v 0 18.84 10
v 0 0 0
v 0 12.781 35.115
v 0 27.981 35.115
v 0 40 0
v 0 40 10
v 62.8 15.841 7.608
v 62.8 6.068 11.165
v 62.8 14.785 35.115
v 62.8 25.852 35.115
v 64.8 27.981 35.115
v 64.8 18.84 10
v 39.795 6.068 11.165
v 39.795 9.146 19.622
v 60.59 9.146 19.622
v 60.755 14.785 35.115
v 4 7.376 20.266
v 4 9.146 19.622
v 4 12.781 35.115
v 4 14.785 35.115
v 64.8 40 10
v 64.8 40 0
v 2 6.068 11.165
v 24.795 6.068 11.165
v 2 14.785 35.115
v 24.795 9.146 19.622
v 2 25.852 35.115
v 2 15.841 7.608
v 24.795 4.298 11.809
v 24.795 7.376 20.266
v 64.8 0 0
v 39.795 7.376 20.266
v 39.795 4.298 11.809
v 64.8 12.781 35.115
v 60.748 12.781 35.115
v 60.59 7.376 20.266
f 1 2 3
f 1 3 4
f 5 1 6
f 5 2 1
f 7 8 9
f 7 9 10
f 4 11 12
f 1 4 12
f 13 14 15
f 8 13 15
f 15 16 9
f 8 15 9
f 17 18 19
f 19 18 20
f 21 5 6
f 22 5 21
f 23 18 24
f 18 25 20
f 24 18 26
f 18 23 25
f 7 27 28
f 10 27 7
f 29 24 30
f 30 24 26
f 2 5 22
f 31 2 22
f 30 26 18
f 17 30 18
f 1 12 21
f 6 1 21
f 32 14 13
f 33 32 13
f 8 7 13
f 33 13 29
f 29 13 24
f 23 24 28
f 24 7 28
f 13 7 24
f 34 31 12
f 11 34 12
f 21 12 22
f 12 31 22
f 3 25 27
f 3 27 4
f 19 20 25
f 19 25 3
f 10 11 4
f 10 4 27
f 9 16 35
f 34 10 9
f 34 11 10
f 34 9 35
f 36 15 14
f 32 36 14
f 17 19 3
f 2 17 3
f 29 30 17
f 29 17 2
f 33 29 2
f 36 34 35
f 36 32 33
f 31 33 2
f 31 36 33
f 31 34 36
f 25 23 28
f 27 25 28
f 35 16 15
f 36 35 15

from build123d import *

# Parameters (mm, degrees)
SKETCH_W        = 64.8
SKETCH_H        = 40
PAD_DEPTH       = 40
POCKET_DEPTH    = 64.801
POCKET001_DEPTH = 64.801
POCKET002_DEPTH = 64.801
SKETCH004_W     = 60.8
SKETCH004_H     = 10.4
POCKET003_DEPTH = 30
POCKET004_DEPTH = 15.5651335663
POCKET005_DEPTH = 64.801


with BuildPart() as part:
    # Sketch → Pad (new body)
    with BuildSketch(Plane.XY):
        with Locations((32.4, 20)):
            Rectangle(SKETCH_W, SKETCH_H)
    extrude(amount=PAD_DEPTH)

    # Sketch001 → Pocket (cut, through all)
    with BuildSketch(Plane.YZ.offset(64.8)):
        Polygon((0, 0), (0, 40), (14.5588093668, 40), align=None)
    extrude(amount=-POCKET_DEPTH, mode=Mode.SUBTRACT)

    # Sketch002 → Pocket001 (cut, through all)
    with BuildSketch(Plane.YZ.offset(64.8)):
        Polygon((29.7588093668, 40), (18.8397023417, 10), (40, 10), (40, 40), align=None)
    extrude(amount=-POCKET001_DEPTH, mode=Mode.SUBTRACT)

    # Sketch003 → Pocket002 (cut, through all)
    with BuildSketch(Plane.YZ.offset(64.8)):
        Polygon((14.5588093668, 40), (27.9807471354, 35.1148141674), (29.7588093668, 40), align=None)
    extrude(amount=-POCKET002_DEPTH, mode=Mode.SUBTRACT)

    # Sketch004 → Pocket003 (cut)
    with BuildSketch(Plane(origin=(0, 14.5588093668, 40), x_dir=(1, 0, 0), z_dir=(0, 0.3420201432, 0.9396926208))):
        with Locations((32.4, 7.0833278364)):
            Rectangle(SKETCH004_W, SKETCH004_H)
    extrude(amount=-POCKET003_DEPTH, mode=Mode.SUBTRACT)

    # Sketch005 → Pocket004 (cut, through all)
    with BuildSketch(Plane(origin=(0, 1.7697492704, -0.6441360564), x_dir=(-1, 0, 0), z_dir=(0, 0.9396926208, -0.3420201432))):
        Polygon((-39.795, 21.5671108977), (-39.795, 12.5671108977), (-24.795, 12.5671108977), (-24.795, 21.5671108977), (-4, 21.5671108977), (-4, 42.5671108977), (-60.8, 42.5671108977), (-60.59, 21.5671108977), align=None)
    extrude(amount=-POCKET004_DEPTH, mode=Mode.SUBTRACT)

    # Sketch006 → Pocket005 (cut, through all)
    with BuildSketch(Plane.YZ.offset(64.8)):
        Polygon((27.9807471354, 35.1148141674), (12.7807471354, 35.1148141674), (14.5588093668, 40), align=None)
    extrude(amount=-POCKET005_DEPTH, mode=Mode.SUBTRACT)


solid = part.part
